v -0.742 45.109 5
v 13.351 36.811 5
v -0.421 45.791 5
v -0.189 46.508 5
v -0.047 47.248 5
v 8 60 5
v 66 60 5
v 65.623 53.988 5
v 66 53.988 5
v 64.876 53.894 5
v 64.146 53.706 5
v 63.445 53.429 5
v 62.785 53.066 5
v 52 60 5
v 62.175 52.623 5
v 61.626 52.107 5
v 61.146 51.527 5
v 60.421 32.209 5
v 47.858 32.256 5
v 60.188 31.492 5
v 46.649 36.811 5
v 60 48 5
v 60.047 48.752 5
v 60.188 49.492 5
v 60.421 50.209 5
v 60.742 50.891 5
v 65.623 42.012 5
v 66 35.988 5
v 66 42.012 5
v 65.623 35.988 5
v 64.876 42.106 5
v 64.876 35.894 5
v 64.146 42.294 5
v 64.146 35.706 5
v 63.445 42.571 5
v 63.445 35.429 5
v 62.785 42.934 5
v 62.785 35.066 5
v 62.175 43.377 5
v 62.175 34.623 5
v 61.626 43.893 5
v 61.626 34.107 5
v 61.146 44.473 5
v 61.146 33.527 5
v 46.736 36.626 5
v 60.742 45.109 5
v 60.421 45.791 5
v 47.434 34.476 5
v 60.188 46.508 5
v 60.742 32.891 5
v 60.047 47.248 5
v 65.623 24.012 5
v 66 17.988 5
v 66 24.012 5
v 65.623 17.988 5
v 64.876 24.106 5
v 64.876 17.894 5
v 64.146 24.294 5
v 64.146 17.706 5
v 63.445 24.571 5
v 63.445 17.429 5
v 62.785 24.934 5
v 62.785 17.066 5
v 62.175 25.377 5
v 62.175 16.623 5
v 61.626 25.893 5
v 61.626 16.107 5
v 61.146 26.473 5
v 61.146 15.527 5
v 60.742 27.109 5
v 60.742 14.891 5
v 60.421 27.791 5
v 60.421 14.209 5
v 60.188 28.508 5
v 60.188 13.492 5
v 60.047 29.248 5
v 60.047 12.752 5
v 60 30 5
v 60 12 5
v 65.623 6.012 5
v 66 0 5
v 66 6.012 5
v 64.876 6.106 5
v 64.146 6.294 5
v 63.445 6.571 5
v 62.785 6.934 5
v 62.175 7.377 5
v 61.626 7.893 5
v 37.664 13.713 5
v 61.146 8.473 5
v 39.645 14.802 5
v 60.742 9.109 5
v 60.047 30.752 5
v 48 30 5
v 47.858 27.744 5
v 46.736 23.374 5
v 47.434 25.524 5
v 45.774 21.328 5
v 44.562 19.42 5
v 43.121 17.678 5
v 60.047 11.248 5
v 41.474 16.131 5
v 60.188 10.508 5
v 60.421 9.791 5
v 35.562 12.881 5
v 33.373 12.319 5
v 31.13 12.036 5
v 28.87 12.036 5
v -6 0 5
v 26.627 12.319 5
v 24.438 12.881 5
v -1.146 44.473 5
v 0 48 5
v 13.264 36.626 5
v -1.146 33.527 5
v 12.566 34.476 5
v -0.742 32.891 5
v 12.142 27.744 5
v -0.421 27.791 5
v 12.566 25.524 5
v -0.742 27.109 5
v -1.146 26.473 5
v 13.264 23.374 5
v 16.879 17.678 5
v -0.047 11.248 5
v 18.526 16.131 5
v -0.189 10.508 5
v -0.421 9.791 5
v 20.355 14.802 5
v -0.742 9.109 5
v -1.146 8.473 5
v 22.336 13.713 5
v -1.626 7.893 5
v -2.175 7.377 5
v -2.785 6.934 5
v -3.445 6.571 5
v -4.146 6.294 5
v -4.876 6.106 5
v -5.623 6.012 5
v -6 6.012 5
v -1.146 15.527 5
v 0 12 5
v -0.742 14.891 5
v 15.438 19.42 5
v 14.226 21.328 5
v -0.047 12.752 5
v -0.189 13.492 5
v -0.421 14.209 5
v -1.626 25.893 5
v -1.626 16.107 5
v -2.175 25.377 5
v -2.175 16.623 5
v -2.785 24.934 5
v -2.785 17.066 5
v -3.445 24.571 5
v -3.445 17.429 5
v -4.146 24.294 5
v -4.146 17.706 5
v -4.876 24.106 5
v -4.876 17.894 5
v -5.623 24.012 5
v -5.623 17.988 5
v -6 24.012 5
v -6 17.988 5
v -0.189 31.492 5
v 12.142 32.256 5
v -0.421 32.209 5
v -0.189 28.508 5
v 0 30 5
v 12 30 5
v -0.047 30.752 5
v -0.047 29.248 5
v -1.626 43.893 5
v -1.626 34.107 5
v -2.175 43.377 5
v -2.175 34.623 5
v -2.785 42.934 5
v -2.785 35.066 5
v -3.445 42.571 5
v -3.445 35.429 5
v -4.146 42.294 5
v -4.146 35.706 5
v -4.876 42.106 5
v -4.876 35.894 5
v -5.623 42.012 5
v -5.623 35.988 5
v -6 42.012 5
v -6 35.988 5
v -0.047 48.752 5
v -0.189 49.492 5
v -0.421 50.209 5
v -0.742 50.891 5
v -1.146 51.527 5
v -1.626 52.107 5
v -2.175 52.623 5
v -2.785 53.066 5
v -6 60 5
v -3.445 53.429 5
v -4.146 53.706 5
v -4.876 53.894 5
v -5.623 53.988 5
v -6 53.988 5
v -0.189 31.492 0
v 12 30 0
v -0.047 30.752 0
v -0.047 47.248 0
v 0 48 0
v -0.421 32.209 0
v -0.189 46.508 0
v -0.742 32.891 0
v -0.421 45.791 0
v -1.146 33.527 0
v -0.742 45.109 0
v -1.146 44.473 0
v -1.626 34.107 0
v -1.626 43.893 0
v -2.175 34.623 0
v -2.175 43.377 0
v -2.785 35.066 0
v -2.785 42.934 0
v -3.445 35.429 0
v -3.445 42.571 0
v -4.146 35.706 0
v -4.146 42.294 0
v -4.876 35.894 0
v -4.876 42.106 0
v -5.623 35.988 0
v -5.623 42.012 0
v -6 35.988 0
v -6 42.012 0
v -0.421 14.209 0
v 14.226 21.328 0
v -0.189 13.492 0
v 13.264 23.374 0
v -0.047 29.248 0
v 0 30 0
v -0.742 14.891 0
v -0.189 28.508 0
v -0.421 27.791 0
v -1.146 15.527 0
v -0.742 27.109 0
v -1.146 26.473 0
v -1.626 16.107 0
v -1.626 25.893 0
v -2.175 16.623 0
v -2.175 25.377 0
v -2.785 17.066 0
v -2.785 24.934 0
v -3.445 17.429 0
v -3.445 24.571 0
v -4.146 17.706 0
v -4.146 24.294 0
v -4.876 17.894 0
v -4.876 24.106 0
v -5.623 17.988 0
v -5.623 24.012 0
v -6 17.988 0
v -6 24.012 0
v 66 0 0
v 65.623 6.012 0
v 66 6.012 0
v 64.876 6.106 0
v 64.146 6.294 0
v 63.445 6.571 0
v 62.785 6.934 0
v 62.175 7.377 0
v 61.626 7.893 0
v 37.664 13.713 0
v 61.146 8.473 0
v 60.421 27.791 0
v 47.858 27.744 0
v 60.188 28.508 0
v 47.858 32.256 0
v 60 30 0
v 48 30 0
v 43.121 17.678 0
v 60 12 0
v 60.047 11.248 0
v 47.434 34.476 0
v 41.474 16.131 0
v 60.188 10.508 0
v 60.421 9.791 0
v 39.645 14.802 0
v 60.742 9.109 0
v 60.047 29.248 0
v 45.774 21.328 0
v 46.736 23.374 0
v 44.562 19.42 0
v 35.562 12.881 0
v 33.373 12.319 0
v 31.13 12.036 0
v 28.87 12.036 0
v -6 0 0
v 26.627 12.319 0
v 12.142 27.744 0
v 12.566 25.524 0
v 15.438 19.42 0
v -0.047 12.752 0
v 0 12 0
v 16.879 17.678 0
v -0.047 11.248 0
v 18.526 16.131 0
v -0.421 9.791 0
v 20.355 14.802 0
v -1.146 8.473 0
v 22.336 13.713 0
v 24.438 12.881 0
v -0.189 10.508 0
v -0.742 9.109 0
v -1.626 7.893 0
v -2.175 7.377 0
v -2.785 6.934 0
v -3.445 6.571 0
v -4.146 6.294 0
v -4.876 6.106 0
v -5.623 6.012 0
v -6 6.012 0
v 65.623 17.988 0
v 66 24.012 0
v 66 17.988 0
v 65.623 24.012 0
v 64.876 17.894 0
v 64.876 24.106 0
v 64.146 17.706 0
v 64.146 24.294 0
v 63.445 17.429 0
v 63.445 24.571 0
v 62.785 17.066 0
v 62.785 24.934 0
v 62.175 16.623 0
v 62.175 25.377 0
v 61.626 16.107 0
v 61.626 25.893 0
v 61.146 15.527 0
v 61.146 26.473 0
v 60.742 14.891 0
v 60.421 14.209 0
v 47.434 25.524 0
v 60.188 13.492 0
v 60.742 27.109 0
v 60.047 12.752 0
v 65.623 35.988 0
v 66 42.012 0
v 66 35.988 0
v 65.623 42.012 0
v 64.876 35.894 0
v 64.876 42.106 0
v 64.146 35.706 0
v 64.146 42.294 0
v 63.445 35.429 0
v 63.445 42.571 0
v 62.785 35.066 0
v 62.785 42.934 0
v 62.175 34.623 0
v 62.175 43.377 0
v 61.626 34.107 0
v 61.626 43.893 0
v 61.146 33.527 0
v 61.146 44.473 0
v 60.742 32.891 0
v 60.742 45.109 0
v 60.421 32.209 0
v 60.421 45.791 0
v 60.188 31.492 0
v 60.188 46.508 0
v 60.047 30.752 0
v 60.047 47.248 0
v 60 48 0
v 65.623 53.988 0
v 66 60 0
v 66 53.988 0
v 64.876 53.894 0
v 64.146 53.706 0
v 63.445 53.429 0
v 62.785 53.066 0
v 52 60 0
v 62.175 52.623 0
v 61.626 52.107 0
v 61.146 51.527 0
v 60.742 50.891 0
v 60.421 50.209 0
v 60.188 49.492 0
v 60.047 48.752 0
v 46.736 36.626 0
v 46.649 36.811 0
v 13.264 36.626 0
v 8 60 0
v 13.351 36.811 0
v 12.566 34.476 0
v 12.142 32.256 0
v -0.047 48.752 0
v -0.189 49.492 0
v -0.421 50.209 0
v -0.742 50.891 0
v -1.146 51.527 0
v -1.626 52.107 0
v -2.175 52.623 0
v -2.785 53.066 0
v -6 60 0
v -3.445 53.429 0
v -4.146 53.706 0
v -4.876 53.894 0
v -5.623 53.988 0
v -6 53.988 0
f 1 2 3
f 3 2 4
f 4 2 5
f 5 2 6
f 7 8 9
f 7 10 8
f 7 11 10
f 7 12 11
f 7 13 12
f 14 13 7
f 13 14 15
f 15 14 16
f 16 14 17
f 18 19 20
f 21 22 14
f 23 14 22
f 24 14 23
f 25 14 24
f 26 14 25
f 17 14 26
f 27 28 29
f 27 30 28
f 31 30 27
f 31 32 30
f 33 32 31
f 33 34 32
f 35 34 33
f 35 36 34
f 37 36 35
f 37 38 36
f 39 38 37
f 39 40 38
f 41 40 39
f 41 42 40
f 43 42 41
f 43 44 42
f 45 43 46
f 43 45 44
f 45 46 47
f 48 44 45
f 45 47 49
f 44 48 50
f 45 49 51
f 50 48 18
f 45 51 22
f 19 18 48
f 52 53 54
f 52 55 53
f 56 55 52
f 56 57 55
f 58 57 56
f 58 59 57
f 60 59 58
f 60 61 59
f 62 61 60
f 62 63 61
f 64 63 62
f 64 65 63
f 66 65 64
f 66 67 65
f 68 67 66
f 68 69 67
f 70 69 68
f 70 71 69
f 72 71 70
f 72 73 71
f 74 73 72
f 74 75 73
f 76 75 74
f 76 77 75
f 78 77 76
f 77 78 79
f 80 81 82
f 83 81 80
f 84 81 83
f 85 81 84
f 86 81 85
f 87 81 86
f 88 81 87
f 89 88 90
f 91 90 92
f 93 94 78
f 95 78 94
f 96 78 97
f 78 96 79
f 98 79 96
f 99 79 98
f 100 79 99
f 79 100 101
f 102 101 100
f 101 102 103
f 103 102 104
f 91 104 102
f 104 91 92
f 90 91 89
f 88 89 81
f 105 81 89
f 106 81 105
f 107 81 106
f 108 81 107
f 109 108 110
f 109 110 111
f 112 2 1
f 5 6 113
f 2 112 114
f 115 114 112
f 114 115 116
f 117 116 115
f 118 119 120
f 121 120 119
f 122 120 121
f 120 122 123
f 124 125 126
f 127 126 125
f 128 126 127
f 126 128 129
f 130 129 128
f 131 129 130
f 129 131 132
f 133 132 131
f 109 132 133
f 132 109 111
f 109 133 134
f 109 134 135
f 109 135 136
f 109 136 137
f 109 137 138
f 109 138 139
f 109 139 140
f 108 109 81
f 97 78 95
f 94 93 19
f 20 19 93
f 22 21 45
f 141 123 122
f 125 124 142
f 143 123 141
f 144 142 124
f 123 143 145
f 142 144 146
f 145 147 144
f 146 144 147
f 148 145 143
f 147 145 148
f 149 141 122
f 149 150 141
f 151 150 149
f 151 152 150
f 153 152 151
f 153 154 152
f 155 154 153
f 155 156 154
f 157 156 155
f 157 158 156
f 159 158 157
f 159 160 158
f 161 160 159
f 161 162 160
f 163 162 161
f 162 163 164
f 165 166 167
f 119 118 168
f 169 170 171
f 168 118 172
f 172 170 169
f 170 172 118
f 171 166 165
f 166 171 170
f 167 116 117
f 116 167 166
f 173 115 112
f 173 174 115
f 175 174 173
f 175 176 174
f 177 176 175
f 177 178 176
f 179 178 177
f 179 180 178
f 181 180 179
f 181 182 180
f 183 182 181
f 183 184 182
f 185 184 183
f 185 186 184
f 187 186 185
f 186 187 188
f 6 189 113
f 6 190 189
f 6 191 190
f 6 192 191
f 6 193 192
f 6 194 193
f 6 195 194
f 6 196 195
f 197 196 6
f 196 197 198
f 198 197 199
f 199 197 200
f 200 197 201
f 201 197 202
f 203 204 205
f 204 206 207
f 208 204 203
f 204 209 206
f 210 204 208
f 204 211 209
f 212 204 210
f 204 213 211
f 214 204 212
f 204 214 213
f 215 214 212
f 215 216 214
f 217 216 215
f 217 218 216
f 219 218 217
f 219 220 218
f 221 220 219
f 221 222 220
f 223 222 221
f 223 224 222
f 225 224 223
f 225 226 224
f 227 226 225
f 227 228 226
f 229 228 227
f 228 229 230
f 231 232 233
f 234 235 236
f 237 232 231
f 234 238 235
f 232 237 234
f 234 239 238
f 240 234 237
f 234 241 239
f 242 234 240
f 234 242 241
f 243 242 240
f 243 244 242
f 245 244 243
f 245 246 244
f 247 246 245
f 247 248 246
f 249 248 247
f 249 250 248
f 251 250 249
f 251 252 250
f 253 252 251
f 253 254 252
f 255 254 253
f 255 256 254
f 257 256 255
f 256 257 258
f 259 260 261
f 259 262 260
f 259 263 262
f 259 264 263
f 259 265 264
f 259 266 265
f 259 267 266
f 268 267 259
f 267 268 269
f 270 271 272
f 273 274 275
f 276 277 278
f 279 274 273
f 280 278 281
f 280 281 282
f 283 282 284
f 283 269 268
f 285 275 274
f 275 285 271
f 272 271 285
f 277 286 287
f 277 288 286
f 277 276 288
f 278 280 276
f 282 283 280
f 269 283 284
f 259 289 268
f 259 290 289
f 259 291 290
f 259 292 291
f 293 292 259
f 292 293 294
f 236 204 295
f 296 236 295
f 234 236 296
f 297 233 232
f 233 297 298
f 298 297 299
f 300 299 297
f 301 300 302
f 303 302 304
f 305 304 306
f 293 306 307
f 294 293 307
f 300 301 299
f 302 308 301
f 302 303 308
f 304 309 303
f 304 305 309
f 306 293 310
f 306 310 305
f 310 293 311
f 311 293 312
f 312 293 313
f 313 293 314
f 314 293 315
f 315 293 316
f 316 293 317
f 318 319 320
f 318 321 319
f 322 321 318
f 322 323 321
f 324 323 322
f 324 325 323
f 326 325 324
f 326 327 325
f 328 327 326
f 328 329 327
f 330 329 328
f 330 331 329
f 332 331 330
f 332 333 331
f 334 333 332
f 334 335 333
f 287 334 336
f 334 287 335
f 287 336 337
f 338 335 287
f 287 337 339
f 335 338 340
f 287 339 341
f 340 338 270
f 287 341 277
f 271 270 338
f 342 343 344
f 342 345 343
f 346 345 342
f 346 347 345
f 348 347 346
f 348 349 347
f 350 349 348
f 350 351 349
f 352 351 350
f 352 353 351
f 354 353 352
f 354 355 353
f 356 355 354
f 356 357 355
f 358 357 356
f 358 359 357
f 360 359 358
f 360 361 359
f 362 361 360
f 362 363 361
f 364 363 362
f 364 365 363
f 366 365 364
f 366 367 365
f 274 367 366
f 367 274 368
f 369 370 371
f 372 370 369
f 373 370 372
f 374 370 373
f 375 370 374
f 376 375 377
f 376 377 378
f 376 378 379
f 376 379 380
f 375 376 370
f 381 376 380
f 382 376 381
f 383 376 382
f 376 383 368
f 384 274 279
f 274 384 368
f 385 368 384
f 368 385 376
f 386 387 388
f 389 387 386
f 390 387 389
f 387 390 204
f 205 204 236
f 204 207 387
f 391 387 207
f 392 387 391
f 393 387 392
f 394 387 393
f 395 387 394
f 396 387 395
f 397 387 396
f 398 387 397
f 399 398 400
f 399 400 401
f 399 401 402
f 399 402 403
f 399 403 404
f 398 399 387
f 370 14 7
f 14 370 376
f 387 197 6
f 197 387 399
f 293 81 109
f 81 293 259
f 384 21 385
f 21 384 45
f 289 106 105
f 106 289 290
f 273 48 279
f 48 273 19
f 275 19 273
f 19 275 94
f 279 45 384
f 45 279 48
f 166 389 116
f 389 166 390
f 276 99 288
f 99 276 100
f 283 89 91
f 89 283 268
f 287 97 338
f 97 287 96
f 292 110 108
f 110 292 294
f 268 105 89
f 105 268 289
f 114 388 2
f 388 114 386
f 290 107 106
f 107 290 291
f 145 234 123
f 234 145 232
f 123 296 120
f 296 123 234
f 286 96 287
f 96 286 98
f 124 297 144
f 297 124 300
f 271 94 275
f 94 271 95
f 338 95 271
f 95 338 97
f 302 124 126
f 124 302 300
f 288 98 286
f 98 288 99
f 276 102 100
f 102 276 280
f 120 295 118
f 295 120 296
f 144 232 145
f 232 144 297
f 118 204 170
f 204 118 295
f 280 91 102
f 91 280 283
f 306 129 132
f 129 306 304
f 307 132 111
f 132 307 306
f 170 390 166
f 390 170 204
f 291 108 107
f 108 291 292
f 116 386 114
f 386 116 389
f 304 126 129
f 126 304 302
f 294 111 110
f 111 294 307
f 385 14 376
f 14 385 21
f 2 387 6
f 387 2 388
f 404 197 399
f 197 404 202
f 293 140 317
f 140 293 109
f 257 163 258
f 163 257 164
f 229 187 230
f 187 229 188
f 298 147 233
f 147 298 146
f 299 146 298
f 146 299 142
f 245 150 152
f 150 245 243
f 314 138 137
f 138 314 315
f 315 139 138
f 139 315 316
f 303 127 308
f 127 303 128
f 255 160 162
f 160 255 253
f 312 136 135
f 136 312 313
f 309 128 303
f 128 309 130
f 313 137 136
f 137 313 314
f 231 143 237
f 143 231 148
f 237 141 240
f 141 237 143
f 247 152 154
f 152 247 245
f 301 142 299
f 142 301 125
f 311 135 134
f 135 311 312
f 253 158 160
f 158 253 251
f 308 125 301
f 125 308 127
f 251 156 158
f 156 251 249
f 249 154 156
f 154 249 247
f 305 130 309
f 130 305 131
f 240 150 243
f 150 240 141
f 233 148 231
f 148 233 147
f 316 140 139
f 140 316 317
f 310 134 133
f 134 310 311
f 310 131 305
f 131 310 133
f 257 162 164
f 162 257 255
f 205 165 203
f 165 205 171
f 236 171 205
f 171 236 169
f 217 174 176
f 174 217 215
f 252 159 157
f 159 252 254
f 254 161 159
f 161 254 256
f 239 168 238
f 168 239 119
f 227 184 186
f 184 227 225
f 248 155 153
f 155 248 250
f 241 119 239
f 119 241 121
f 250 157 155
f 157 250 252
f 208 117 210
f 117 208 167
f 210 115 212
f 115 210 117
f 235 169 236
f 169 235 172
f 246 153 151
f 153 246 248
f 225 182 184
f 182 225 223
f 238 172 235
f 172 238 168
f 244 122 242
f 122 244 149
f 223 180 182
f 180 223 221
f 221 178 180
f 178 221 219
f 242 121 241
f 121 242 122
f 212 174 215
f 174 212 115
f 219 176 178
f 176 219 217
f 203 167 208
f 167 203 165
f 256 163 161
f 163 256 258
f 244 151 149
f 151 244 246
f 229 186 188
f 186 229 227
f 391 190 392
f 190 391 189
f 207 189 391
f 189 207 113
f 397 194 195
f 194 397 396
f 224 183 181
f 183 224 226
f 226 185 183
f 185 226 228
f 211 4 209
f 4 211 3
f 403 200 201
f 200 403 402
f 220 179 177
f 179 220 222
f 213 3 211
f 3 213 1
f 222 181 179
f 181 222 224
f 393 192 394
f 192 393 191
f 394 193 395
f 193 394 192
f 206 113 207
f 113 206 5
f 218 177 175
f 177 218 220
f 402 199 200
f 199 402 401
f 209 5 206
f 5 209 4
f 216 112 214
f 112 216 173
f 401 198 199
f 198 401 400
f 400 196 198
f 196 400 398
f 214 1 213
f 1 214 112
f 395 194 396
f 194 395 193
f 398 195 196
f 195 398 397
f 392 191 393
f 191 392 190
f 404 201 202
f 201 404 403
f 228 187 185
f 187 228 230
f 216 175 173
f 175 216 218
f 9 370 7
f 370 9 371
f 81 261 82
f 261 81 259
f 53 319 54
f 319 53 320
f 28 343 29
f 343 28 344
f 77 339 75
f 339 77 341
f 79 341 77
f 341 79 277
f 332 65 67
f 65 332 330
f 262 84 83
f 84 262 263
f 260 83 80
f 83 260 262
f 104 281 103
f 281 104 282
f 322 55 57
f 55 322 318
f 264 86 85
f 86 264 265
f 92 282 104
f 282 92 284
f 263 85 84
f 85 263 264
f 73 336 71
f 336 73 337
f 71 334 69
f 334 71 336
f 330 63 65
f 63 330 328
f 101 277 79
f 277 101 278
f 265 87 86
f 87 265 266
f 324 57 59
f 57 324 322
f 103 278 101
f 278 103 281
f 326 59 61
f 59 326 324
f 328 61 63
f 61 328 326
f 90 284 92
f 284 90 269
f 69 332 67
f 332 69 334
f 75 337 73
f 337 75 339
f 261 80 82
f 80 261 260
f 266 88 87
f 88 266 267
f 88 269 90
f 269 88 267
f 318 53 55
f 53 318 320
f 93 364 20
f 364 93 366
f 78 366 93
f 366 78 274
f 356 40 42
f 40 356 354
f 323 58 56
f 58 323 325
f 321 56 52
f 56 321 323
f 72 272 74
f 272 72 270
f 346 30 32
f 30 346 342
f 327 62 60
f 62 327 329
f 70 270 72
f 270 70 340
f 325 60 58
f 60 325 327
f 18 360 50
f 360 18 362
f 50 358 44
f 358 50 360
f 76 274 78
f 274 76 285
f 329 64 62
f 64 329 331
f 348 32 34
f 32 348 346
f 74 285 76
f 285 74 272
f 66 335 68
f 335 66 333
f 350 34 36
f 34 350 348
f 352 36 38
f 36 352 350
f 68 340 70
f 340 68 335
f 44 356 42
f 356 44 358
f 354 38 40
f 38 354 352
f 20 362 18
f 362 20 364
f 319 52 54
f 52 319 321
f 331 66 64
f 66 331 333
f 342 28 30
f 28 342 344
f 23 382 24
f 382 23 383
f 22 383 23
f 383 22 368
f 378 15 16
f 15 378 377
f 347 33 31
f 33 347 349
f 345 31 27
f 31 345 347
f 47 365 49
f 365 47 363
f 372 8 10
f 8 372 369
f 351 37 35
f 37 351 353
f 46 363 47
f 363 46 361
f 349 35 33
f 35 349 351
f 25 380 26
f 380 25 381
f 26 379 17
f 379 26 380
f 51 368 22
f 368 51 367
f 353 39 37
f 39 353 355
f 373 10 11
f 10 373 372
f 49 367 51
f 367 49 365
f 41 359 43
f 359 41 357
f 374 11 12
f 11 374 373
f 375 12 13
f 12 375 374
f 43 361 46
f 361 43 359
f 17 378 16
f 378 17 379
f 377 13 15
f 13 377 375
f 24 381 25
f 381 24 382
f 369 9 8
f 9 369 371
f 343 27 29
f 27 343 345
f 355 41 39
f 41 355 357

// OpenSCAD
$fn=50;

thick = 5;
bung_lock = [60, 60, thick];
ferm_rt = 18;
ferm_rb = 19;
neck_opening_start_x = 14; //13; -- third attempt //18; -- first attempt
neck_opening_end_x = bung_lock.x - neck_opening_start_x;
neck_opening_end_y = bung_lock.y;
neck_opening_start_y = bung_lock.y - 26;
neck_opening_offset_x = 8;

difference() {
    cube(bung_lock);

    // ferm hole
    translate([bung_lock.x / 2, bung_lock.y / 2, 0])
        cylinder(bung_lock.z, ferm_rt, ferm_rt);

    polyhedron(points = [[neck_opening_start_x, neck_opening_start_y, 0], [neck_opening_end_x, neck_opening_start_y, 0], [bung_lock.x - neck_opening_offset_x, neck_opening_end_y, 0], [neck_opening_offset_x, neck_opening_end_y, 0],
                         [neck_opening_start_x, neck_opening_start_y, bung_lock.z], [neck_opening_end_x, neck_opening_start_y, bung_lock.z], [bung_lock.x - neck_opening_offset_x, neck_opening_end_y, bung_lock.z], [neck_opening_offset_x, neck_opening_end_y, bung_lock.z]],
                faces = [[0, 1, 2, 3], [4, 5, 1, 0], [7, 6, 5, 4], 
                         [5, 6, 2, 1], [6, 7, 3, 2], [7, 4, 0, 3]]);
}

translate([-6, 0, 0])
    rubberband_holder(thick, 6, 6);

translate([bung_lock.x + 6, 0, thick])
    rotate([0, 180, 0])
        rubberband_holder(thick, 6, 6);

module rubberband_holder(thick, notch_r, peg_y)
{
    //thick = 2;
    //notch_r = 6;
    //peg_y = 6;
    
    difference() {
        cube([notch_r, bung_lock.y, thick]);
        
        translate([0, notch_r + peg_y, 0])
            cylinder(thick, notch_r, notch_r);
    
        translate([0, 2 * (notch_r + peg_y) + peg_y, 0])
            cylinder(thick, notch_r, notch_r);
        
        translate([0, 3 * (notch_r + peg_y) + 2 * peg_y, 0])
            cylinder(thick, notch_r, notch_r);
    }
}

module rubber_band_holder(peg, circ_r, chamf_z) {

    difference() {
        cube(peg);
        
        // chamfer
        translate([0, 0, chamf_z])
            rotate(a = [0, -30, 0])
                cube([6, peg.y, peg.z]);
        
        // circular notch
        translate([5.2 + circ_r, 0, chamf_z + circ_r])
            rotate(a = [-90, 0, 0])
                cylinder(peg.y, circ_r, circ_r);
        
        translate([5.2, 0, 2 + circ_r])
            cube([circ_r * 2, peg.y, peg.z - chamf_z - circ_r]);
        
        translate([5.2, 0, 2 + circ_r])
                rotate([0, -30, 0])
                    cube([1.5, peg.y, peg.z - chamf_z - circ_r]);
    }

}
